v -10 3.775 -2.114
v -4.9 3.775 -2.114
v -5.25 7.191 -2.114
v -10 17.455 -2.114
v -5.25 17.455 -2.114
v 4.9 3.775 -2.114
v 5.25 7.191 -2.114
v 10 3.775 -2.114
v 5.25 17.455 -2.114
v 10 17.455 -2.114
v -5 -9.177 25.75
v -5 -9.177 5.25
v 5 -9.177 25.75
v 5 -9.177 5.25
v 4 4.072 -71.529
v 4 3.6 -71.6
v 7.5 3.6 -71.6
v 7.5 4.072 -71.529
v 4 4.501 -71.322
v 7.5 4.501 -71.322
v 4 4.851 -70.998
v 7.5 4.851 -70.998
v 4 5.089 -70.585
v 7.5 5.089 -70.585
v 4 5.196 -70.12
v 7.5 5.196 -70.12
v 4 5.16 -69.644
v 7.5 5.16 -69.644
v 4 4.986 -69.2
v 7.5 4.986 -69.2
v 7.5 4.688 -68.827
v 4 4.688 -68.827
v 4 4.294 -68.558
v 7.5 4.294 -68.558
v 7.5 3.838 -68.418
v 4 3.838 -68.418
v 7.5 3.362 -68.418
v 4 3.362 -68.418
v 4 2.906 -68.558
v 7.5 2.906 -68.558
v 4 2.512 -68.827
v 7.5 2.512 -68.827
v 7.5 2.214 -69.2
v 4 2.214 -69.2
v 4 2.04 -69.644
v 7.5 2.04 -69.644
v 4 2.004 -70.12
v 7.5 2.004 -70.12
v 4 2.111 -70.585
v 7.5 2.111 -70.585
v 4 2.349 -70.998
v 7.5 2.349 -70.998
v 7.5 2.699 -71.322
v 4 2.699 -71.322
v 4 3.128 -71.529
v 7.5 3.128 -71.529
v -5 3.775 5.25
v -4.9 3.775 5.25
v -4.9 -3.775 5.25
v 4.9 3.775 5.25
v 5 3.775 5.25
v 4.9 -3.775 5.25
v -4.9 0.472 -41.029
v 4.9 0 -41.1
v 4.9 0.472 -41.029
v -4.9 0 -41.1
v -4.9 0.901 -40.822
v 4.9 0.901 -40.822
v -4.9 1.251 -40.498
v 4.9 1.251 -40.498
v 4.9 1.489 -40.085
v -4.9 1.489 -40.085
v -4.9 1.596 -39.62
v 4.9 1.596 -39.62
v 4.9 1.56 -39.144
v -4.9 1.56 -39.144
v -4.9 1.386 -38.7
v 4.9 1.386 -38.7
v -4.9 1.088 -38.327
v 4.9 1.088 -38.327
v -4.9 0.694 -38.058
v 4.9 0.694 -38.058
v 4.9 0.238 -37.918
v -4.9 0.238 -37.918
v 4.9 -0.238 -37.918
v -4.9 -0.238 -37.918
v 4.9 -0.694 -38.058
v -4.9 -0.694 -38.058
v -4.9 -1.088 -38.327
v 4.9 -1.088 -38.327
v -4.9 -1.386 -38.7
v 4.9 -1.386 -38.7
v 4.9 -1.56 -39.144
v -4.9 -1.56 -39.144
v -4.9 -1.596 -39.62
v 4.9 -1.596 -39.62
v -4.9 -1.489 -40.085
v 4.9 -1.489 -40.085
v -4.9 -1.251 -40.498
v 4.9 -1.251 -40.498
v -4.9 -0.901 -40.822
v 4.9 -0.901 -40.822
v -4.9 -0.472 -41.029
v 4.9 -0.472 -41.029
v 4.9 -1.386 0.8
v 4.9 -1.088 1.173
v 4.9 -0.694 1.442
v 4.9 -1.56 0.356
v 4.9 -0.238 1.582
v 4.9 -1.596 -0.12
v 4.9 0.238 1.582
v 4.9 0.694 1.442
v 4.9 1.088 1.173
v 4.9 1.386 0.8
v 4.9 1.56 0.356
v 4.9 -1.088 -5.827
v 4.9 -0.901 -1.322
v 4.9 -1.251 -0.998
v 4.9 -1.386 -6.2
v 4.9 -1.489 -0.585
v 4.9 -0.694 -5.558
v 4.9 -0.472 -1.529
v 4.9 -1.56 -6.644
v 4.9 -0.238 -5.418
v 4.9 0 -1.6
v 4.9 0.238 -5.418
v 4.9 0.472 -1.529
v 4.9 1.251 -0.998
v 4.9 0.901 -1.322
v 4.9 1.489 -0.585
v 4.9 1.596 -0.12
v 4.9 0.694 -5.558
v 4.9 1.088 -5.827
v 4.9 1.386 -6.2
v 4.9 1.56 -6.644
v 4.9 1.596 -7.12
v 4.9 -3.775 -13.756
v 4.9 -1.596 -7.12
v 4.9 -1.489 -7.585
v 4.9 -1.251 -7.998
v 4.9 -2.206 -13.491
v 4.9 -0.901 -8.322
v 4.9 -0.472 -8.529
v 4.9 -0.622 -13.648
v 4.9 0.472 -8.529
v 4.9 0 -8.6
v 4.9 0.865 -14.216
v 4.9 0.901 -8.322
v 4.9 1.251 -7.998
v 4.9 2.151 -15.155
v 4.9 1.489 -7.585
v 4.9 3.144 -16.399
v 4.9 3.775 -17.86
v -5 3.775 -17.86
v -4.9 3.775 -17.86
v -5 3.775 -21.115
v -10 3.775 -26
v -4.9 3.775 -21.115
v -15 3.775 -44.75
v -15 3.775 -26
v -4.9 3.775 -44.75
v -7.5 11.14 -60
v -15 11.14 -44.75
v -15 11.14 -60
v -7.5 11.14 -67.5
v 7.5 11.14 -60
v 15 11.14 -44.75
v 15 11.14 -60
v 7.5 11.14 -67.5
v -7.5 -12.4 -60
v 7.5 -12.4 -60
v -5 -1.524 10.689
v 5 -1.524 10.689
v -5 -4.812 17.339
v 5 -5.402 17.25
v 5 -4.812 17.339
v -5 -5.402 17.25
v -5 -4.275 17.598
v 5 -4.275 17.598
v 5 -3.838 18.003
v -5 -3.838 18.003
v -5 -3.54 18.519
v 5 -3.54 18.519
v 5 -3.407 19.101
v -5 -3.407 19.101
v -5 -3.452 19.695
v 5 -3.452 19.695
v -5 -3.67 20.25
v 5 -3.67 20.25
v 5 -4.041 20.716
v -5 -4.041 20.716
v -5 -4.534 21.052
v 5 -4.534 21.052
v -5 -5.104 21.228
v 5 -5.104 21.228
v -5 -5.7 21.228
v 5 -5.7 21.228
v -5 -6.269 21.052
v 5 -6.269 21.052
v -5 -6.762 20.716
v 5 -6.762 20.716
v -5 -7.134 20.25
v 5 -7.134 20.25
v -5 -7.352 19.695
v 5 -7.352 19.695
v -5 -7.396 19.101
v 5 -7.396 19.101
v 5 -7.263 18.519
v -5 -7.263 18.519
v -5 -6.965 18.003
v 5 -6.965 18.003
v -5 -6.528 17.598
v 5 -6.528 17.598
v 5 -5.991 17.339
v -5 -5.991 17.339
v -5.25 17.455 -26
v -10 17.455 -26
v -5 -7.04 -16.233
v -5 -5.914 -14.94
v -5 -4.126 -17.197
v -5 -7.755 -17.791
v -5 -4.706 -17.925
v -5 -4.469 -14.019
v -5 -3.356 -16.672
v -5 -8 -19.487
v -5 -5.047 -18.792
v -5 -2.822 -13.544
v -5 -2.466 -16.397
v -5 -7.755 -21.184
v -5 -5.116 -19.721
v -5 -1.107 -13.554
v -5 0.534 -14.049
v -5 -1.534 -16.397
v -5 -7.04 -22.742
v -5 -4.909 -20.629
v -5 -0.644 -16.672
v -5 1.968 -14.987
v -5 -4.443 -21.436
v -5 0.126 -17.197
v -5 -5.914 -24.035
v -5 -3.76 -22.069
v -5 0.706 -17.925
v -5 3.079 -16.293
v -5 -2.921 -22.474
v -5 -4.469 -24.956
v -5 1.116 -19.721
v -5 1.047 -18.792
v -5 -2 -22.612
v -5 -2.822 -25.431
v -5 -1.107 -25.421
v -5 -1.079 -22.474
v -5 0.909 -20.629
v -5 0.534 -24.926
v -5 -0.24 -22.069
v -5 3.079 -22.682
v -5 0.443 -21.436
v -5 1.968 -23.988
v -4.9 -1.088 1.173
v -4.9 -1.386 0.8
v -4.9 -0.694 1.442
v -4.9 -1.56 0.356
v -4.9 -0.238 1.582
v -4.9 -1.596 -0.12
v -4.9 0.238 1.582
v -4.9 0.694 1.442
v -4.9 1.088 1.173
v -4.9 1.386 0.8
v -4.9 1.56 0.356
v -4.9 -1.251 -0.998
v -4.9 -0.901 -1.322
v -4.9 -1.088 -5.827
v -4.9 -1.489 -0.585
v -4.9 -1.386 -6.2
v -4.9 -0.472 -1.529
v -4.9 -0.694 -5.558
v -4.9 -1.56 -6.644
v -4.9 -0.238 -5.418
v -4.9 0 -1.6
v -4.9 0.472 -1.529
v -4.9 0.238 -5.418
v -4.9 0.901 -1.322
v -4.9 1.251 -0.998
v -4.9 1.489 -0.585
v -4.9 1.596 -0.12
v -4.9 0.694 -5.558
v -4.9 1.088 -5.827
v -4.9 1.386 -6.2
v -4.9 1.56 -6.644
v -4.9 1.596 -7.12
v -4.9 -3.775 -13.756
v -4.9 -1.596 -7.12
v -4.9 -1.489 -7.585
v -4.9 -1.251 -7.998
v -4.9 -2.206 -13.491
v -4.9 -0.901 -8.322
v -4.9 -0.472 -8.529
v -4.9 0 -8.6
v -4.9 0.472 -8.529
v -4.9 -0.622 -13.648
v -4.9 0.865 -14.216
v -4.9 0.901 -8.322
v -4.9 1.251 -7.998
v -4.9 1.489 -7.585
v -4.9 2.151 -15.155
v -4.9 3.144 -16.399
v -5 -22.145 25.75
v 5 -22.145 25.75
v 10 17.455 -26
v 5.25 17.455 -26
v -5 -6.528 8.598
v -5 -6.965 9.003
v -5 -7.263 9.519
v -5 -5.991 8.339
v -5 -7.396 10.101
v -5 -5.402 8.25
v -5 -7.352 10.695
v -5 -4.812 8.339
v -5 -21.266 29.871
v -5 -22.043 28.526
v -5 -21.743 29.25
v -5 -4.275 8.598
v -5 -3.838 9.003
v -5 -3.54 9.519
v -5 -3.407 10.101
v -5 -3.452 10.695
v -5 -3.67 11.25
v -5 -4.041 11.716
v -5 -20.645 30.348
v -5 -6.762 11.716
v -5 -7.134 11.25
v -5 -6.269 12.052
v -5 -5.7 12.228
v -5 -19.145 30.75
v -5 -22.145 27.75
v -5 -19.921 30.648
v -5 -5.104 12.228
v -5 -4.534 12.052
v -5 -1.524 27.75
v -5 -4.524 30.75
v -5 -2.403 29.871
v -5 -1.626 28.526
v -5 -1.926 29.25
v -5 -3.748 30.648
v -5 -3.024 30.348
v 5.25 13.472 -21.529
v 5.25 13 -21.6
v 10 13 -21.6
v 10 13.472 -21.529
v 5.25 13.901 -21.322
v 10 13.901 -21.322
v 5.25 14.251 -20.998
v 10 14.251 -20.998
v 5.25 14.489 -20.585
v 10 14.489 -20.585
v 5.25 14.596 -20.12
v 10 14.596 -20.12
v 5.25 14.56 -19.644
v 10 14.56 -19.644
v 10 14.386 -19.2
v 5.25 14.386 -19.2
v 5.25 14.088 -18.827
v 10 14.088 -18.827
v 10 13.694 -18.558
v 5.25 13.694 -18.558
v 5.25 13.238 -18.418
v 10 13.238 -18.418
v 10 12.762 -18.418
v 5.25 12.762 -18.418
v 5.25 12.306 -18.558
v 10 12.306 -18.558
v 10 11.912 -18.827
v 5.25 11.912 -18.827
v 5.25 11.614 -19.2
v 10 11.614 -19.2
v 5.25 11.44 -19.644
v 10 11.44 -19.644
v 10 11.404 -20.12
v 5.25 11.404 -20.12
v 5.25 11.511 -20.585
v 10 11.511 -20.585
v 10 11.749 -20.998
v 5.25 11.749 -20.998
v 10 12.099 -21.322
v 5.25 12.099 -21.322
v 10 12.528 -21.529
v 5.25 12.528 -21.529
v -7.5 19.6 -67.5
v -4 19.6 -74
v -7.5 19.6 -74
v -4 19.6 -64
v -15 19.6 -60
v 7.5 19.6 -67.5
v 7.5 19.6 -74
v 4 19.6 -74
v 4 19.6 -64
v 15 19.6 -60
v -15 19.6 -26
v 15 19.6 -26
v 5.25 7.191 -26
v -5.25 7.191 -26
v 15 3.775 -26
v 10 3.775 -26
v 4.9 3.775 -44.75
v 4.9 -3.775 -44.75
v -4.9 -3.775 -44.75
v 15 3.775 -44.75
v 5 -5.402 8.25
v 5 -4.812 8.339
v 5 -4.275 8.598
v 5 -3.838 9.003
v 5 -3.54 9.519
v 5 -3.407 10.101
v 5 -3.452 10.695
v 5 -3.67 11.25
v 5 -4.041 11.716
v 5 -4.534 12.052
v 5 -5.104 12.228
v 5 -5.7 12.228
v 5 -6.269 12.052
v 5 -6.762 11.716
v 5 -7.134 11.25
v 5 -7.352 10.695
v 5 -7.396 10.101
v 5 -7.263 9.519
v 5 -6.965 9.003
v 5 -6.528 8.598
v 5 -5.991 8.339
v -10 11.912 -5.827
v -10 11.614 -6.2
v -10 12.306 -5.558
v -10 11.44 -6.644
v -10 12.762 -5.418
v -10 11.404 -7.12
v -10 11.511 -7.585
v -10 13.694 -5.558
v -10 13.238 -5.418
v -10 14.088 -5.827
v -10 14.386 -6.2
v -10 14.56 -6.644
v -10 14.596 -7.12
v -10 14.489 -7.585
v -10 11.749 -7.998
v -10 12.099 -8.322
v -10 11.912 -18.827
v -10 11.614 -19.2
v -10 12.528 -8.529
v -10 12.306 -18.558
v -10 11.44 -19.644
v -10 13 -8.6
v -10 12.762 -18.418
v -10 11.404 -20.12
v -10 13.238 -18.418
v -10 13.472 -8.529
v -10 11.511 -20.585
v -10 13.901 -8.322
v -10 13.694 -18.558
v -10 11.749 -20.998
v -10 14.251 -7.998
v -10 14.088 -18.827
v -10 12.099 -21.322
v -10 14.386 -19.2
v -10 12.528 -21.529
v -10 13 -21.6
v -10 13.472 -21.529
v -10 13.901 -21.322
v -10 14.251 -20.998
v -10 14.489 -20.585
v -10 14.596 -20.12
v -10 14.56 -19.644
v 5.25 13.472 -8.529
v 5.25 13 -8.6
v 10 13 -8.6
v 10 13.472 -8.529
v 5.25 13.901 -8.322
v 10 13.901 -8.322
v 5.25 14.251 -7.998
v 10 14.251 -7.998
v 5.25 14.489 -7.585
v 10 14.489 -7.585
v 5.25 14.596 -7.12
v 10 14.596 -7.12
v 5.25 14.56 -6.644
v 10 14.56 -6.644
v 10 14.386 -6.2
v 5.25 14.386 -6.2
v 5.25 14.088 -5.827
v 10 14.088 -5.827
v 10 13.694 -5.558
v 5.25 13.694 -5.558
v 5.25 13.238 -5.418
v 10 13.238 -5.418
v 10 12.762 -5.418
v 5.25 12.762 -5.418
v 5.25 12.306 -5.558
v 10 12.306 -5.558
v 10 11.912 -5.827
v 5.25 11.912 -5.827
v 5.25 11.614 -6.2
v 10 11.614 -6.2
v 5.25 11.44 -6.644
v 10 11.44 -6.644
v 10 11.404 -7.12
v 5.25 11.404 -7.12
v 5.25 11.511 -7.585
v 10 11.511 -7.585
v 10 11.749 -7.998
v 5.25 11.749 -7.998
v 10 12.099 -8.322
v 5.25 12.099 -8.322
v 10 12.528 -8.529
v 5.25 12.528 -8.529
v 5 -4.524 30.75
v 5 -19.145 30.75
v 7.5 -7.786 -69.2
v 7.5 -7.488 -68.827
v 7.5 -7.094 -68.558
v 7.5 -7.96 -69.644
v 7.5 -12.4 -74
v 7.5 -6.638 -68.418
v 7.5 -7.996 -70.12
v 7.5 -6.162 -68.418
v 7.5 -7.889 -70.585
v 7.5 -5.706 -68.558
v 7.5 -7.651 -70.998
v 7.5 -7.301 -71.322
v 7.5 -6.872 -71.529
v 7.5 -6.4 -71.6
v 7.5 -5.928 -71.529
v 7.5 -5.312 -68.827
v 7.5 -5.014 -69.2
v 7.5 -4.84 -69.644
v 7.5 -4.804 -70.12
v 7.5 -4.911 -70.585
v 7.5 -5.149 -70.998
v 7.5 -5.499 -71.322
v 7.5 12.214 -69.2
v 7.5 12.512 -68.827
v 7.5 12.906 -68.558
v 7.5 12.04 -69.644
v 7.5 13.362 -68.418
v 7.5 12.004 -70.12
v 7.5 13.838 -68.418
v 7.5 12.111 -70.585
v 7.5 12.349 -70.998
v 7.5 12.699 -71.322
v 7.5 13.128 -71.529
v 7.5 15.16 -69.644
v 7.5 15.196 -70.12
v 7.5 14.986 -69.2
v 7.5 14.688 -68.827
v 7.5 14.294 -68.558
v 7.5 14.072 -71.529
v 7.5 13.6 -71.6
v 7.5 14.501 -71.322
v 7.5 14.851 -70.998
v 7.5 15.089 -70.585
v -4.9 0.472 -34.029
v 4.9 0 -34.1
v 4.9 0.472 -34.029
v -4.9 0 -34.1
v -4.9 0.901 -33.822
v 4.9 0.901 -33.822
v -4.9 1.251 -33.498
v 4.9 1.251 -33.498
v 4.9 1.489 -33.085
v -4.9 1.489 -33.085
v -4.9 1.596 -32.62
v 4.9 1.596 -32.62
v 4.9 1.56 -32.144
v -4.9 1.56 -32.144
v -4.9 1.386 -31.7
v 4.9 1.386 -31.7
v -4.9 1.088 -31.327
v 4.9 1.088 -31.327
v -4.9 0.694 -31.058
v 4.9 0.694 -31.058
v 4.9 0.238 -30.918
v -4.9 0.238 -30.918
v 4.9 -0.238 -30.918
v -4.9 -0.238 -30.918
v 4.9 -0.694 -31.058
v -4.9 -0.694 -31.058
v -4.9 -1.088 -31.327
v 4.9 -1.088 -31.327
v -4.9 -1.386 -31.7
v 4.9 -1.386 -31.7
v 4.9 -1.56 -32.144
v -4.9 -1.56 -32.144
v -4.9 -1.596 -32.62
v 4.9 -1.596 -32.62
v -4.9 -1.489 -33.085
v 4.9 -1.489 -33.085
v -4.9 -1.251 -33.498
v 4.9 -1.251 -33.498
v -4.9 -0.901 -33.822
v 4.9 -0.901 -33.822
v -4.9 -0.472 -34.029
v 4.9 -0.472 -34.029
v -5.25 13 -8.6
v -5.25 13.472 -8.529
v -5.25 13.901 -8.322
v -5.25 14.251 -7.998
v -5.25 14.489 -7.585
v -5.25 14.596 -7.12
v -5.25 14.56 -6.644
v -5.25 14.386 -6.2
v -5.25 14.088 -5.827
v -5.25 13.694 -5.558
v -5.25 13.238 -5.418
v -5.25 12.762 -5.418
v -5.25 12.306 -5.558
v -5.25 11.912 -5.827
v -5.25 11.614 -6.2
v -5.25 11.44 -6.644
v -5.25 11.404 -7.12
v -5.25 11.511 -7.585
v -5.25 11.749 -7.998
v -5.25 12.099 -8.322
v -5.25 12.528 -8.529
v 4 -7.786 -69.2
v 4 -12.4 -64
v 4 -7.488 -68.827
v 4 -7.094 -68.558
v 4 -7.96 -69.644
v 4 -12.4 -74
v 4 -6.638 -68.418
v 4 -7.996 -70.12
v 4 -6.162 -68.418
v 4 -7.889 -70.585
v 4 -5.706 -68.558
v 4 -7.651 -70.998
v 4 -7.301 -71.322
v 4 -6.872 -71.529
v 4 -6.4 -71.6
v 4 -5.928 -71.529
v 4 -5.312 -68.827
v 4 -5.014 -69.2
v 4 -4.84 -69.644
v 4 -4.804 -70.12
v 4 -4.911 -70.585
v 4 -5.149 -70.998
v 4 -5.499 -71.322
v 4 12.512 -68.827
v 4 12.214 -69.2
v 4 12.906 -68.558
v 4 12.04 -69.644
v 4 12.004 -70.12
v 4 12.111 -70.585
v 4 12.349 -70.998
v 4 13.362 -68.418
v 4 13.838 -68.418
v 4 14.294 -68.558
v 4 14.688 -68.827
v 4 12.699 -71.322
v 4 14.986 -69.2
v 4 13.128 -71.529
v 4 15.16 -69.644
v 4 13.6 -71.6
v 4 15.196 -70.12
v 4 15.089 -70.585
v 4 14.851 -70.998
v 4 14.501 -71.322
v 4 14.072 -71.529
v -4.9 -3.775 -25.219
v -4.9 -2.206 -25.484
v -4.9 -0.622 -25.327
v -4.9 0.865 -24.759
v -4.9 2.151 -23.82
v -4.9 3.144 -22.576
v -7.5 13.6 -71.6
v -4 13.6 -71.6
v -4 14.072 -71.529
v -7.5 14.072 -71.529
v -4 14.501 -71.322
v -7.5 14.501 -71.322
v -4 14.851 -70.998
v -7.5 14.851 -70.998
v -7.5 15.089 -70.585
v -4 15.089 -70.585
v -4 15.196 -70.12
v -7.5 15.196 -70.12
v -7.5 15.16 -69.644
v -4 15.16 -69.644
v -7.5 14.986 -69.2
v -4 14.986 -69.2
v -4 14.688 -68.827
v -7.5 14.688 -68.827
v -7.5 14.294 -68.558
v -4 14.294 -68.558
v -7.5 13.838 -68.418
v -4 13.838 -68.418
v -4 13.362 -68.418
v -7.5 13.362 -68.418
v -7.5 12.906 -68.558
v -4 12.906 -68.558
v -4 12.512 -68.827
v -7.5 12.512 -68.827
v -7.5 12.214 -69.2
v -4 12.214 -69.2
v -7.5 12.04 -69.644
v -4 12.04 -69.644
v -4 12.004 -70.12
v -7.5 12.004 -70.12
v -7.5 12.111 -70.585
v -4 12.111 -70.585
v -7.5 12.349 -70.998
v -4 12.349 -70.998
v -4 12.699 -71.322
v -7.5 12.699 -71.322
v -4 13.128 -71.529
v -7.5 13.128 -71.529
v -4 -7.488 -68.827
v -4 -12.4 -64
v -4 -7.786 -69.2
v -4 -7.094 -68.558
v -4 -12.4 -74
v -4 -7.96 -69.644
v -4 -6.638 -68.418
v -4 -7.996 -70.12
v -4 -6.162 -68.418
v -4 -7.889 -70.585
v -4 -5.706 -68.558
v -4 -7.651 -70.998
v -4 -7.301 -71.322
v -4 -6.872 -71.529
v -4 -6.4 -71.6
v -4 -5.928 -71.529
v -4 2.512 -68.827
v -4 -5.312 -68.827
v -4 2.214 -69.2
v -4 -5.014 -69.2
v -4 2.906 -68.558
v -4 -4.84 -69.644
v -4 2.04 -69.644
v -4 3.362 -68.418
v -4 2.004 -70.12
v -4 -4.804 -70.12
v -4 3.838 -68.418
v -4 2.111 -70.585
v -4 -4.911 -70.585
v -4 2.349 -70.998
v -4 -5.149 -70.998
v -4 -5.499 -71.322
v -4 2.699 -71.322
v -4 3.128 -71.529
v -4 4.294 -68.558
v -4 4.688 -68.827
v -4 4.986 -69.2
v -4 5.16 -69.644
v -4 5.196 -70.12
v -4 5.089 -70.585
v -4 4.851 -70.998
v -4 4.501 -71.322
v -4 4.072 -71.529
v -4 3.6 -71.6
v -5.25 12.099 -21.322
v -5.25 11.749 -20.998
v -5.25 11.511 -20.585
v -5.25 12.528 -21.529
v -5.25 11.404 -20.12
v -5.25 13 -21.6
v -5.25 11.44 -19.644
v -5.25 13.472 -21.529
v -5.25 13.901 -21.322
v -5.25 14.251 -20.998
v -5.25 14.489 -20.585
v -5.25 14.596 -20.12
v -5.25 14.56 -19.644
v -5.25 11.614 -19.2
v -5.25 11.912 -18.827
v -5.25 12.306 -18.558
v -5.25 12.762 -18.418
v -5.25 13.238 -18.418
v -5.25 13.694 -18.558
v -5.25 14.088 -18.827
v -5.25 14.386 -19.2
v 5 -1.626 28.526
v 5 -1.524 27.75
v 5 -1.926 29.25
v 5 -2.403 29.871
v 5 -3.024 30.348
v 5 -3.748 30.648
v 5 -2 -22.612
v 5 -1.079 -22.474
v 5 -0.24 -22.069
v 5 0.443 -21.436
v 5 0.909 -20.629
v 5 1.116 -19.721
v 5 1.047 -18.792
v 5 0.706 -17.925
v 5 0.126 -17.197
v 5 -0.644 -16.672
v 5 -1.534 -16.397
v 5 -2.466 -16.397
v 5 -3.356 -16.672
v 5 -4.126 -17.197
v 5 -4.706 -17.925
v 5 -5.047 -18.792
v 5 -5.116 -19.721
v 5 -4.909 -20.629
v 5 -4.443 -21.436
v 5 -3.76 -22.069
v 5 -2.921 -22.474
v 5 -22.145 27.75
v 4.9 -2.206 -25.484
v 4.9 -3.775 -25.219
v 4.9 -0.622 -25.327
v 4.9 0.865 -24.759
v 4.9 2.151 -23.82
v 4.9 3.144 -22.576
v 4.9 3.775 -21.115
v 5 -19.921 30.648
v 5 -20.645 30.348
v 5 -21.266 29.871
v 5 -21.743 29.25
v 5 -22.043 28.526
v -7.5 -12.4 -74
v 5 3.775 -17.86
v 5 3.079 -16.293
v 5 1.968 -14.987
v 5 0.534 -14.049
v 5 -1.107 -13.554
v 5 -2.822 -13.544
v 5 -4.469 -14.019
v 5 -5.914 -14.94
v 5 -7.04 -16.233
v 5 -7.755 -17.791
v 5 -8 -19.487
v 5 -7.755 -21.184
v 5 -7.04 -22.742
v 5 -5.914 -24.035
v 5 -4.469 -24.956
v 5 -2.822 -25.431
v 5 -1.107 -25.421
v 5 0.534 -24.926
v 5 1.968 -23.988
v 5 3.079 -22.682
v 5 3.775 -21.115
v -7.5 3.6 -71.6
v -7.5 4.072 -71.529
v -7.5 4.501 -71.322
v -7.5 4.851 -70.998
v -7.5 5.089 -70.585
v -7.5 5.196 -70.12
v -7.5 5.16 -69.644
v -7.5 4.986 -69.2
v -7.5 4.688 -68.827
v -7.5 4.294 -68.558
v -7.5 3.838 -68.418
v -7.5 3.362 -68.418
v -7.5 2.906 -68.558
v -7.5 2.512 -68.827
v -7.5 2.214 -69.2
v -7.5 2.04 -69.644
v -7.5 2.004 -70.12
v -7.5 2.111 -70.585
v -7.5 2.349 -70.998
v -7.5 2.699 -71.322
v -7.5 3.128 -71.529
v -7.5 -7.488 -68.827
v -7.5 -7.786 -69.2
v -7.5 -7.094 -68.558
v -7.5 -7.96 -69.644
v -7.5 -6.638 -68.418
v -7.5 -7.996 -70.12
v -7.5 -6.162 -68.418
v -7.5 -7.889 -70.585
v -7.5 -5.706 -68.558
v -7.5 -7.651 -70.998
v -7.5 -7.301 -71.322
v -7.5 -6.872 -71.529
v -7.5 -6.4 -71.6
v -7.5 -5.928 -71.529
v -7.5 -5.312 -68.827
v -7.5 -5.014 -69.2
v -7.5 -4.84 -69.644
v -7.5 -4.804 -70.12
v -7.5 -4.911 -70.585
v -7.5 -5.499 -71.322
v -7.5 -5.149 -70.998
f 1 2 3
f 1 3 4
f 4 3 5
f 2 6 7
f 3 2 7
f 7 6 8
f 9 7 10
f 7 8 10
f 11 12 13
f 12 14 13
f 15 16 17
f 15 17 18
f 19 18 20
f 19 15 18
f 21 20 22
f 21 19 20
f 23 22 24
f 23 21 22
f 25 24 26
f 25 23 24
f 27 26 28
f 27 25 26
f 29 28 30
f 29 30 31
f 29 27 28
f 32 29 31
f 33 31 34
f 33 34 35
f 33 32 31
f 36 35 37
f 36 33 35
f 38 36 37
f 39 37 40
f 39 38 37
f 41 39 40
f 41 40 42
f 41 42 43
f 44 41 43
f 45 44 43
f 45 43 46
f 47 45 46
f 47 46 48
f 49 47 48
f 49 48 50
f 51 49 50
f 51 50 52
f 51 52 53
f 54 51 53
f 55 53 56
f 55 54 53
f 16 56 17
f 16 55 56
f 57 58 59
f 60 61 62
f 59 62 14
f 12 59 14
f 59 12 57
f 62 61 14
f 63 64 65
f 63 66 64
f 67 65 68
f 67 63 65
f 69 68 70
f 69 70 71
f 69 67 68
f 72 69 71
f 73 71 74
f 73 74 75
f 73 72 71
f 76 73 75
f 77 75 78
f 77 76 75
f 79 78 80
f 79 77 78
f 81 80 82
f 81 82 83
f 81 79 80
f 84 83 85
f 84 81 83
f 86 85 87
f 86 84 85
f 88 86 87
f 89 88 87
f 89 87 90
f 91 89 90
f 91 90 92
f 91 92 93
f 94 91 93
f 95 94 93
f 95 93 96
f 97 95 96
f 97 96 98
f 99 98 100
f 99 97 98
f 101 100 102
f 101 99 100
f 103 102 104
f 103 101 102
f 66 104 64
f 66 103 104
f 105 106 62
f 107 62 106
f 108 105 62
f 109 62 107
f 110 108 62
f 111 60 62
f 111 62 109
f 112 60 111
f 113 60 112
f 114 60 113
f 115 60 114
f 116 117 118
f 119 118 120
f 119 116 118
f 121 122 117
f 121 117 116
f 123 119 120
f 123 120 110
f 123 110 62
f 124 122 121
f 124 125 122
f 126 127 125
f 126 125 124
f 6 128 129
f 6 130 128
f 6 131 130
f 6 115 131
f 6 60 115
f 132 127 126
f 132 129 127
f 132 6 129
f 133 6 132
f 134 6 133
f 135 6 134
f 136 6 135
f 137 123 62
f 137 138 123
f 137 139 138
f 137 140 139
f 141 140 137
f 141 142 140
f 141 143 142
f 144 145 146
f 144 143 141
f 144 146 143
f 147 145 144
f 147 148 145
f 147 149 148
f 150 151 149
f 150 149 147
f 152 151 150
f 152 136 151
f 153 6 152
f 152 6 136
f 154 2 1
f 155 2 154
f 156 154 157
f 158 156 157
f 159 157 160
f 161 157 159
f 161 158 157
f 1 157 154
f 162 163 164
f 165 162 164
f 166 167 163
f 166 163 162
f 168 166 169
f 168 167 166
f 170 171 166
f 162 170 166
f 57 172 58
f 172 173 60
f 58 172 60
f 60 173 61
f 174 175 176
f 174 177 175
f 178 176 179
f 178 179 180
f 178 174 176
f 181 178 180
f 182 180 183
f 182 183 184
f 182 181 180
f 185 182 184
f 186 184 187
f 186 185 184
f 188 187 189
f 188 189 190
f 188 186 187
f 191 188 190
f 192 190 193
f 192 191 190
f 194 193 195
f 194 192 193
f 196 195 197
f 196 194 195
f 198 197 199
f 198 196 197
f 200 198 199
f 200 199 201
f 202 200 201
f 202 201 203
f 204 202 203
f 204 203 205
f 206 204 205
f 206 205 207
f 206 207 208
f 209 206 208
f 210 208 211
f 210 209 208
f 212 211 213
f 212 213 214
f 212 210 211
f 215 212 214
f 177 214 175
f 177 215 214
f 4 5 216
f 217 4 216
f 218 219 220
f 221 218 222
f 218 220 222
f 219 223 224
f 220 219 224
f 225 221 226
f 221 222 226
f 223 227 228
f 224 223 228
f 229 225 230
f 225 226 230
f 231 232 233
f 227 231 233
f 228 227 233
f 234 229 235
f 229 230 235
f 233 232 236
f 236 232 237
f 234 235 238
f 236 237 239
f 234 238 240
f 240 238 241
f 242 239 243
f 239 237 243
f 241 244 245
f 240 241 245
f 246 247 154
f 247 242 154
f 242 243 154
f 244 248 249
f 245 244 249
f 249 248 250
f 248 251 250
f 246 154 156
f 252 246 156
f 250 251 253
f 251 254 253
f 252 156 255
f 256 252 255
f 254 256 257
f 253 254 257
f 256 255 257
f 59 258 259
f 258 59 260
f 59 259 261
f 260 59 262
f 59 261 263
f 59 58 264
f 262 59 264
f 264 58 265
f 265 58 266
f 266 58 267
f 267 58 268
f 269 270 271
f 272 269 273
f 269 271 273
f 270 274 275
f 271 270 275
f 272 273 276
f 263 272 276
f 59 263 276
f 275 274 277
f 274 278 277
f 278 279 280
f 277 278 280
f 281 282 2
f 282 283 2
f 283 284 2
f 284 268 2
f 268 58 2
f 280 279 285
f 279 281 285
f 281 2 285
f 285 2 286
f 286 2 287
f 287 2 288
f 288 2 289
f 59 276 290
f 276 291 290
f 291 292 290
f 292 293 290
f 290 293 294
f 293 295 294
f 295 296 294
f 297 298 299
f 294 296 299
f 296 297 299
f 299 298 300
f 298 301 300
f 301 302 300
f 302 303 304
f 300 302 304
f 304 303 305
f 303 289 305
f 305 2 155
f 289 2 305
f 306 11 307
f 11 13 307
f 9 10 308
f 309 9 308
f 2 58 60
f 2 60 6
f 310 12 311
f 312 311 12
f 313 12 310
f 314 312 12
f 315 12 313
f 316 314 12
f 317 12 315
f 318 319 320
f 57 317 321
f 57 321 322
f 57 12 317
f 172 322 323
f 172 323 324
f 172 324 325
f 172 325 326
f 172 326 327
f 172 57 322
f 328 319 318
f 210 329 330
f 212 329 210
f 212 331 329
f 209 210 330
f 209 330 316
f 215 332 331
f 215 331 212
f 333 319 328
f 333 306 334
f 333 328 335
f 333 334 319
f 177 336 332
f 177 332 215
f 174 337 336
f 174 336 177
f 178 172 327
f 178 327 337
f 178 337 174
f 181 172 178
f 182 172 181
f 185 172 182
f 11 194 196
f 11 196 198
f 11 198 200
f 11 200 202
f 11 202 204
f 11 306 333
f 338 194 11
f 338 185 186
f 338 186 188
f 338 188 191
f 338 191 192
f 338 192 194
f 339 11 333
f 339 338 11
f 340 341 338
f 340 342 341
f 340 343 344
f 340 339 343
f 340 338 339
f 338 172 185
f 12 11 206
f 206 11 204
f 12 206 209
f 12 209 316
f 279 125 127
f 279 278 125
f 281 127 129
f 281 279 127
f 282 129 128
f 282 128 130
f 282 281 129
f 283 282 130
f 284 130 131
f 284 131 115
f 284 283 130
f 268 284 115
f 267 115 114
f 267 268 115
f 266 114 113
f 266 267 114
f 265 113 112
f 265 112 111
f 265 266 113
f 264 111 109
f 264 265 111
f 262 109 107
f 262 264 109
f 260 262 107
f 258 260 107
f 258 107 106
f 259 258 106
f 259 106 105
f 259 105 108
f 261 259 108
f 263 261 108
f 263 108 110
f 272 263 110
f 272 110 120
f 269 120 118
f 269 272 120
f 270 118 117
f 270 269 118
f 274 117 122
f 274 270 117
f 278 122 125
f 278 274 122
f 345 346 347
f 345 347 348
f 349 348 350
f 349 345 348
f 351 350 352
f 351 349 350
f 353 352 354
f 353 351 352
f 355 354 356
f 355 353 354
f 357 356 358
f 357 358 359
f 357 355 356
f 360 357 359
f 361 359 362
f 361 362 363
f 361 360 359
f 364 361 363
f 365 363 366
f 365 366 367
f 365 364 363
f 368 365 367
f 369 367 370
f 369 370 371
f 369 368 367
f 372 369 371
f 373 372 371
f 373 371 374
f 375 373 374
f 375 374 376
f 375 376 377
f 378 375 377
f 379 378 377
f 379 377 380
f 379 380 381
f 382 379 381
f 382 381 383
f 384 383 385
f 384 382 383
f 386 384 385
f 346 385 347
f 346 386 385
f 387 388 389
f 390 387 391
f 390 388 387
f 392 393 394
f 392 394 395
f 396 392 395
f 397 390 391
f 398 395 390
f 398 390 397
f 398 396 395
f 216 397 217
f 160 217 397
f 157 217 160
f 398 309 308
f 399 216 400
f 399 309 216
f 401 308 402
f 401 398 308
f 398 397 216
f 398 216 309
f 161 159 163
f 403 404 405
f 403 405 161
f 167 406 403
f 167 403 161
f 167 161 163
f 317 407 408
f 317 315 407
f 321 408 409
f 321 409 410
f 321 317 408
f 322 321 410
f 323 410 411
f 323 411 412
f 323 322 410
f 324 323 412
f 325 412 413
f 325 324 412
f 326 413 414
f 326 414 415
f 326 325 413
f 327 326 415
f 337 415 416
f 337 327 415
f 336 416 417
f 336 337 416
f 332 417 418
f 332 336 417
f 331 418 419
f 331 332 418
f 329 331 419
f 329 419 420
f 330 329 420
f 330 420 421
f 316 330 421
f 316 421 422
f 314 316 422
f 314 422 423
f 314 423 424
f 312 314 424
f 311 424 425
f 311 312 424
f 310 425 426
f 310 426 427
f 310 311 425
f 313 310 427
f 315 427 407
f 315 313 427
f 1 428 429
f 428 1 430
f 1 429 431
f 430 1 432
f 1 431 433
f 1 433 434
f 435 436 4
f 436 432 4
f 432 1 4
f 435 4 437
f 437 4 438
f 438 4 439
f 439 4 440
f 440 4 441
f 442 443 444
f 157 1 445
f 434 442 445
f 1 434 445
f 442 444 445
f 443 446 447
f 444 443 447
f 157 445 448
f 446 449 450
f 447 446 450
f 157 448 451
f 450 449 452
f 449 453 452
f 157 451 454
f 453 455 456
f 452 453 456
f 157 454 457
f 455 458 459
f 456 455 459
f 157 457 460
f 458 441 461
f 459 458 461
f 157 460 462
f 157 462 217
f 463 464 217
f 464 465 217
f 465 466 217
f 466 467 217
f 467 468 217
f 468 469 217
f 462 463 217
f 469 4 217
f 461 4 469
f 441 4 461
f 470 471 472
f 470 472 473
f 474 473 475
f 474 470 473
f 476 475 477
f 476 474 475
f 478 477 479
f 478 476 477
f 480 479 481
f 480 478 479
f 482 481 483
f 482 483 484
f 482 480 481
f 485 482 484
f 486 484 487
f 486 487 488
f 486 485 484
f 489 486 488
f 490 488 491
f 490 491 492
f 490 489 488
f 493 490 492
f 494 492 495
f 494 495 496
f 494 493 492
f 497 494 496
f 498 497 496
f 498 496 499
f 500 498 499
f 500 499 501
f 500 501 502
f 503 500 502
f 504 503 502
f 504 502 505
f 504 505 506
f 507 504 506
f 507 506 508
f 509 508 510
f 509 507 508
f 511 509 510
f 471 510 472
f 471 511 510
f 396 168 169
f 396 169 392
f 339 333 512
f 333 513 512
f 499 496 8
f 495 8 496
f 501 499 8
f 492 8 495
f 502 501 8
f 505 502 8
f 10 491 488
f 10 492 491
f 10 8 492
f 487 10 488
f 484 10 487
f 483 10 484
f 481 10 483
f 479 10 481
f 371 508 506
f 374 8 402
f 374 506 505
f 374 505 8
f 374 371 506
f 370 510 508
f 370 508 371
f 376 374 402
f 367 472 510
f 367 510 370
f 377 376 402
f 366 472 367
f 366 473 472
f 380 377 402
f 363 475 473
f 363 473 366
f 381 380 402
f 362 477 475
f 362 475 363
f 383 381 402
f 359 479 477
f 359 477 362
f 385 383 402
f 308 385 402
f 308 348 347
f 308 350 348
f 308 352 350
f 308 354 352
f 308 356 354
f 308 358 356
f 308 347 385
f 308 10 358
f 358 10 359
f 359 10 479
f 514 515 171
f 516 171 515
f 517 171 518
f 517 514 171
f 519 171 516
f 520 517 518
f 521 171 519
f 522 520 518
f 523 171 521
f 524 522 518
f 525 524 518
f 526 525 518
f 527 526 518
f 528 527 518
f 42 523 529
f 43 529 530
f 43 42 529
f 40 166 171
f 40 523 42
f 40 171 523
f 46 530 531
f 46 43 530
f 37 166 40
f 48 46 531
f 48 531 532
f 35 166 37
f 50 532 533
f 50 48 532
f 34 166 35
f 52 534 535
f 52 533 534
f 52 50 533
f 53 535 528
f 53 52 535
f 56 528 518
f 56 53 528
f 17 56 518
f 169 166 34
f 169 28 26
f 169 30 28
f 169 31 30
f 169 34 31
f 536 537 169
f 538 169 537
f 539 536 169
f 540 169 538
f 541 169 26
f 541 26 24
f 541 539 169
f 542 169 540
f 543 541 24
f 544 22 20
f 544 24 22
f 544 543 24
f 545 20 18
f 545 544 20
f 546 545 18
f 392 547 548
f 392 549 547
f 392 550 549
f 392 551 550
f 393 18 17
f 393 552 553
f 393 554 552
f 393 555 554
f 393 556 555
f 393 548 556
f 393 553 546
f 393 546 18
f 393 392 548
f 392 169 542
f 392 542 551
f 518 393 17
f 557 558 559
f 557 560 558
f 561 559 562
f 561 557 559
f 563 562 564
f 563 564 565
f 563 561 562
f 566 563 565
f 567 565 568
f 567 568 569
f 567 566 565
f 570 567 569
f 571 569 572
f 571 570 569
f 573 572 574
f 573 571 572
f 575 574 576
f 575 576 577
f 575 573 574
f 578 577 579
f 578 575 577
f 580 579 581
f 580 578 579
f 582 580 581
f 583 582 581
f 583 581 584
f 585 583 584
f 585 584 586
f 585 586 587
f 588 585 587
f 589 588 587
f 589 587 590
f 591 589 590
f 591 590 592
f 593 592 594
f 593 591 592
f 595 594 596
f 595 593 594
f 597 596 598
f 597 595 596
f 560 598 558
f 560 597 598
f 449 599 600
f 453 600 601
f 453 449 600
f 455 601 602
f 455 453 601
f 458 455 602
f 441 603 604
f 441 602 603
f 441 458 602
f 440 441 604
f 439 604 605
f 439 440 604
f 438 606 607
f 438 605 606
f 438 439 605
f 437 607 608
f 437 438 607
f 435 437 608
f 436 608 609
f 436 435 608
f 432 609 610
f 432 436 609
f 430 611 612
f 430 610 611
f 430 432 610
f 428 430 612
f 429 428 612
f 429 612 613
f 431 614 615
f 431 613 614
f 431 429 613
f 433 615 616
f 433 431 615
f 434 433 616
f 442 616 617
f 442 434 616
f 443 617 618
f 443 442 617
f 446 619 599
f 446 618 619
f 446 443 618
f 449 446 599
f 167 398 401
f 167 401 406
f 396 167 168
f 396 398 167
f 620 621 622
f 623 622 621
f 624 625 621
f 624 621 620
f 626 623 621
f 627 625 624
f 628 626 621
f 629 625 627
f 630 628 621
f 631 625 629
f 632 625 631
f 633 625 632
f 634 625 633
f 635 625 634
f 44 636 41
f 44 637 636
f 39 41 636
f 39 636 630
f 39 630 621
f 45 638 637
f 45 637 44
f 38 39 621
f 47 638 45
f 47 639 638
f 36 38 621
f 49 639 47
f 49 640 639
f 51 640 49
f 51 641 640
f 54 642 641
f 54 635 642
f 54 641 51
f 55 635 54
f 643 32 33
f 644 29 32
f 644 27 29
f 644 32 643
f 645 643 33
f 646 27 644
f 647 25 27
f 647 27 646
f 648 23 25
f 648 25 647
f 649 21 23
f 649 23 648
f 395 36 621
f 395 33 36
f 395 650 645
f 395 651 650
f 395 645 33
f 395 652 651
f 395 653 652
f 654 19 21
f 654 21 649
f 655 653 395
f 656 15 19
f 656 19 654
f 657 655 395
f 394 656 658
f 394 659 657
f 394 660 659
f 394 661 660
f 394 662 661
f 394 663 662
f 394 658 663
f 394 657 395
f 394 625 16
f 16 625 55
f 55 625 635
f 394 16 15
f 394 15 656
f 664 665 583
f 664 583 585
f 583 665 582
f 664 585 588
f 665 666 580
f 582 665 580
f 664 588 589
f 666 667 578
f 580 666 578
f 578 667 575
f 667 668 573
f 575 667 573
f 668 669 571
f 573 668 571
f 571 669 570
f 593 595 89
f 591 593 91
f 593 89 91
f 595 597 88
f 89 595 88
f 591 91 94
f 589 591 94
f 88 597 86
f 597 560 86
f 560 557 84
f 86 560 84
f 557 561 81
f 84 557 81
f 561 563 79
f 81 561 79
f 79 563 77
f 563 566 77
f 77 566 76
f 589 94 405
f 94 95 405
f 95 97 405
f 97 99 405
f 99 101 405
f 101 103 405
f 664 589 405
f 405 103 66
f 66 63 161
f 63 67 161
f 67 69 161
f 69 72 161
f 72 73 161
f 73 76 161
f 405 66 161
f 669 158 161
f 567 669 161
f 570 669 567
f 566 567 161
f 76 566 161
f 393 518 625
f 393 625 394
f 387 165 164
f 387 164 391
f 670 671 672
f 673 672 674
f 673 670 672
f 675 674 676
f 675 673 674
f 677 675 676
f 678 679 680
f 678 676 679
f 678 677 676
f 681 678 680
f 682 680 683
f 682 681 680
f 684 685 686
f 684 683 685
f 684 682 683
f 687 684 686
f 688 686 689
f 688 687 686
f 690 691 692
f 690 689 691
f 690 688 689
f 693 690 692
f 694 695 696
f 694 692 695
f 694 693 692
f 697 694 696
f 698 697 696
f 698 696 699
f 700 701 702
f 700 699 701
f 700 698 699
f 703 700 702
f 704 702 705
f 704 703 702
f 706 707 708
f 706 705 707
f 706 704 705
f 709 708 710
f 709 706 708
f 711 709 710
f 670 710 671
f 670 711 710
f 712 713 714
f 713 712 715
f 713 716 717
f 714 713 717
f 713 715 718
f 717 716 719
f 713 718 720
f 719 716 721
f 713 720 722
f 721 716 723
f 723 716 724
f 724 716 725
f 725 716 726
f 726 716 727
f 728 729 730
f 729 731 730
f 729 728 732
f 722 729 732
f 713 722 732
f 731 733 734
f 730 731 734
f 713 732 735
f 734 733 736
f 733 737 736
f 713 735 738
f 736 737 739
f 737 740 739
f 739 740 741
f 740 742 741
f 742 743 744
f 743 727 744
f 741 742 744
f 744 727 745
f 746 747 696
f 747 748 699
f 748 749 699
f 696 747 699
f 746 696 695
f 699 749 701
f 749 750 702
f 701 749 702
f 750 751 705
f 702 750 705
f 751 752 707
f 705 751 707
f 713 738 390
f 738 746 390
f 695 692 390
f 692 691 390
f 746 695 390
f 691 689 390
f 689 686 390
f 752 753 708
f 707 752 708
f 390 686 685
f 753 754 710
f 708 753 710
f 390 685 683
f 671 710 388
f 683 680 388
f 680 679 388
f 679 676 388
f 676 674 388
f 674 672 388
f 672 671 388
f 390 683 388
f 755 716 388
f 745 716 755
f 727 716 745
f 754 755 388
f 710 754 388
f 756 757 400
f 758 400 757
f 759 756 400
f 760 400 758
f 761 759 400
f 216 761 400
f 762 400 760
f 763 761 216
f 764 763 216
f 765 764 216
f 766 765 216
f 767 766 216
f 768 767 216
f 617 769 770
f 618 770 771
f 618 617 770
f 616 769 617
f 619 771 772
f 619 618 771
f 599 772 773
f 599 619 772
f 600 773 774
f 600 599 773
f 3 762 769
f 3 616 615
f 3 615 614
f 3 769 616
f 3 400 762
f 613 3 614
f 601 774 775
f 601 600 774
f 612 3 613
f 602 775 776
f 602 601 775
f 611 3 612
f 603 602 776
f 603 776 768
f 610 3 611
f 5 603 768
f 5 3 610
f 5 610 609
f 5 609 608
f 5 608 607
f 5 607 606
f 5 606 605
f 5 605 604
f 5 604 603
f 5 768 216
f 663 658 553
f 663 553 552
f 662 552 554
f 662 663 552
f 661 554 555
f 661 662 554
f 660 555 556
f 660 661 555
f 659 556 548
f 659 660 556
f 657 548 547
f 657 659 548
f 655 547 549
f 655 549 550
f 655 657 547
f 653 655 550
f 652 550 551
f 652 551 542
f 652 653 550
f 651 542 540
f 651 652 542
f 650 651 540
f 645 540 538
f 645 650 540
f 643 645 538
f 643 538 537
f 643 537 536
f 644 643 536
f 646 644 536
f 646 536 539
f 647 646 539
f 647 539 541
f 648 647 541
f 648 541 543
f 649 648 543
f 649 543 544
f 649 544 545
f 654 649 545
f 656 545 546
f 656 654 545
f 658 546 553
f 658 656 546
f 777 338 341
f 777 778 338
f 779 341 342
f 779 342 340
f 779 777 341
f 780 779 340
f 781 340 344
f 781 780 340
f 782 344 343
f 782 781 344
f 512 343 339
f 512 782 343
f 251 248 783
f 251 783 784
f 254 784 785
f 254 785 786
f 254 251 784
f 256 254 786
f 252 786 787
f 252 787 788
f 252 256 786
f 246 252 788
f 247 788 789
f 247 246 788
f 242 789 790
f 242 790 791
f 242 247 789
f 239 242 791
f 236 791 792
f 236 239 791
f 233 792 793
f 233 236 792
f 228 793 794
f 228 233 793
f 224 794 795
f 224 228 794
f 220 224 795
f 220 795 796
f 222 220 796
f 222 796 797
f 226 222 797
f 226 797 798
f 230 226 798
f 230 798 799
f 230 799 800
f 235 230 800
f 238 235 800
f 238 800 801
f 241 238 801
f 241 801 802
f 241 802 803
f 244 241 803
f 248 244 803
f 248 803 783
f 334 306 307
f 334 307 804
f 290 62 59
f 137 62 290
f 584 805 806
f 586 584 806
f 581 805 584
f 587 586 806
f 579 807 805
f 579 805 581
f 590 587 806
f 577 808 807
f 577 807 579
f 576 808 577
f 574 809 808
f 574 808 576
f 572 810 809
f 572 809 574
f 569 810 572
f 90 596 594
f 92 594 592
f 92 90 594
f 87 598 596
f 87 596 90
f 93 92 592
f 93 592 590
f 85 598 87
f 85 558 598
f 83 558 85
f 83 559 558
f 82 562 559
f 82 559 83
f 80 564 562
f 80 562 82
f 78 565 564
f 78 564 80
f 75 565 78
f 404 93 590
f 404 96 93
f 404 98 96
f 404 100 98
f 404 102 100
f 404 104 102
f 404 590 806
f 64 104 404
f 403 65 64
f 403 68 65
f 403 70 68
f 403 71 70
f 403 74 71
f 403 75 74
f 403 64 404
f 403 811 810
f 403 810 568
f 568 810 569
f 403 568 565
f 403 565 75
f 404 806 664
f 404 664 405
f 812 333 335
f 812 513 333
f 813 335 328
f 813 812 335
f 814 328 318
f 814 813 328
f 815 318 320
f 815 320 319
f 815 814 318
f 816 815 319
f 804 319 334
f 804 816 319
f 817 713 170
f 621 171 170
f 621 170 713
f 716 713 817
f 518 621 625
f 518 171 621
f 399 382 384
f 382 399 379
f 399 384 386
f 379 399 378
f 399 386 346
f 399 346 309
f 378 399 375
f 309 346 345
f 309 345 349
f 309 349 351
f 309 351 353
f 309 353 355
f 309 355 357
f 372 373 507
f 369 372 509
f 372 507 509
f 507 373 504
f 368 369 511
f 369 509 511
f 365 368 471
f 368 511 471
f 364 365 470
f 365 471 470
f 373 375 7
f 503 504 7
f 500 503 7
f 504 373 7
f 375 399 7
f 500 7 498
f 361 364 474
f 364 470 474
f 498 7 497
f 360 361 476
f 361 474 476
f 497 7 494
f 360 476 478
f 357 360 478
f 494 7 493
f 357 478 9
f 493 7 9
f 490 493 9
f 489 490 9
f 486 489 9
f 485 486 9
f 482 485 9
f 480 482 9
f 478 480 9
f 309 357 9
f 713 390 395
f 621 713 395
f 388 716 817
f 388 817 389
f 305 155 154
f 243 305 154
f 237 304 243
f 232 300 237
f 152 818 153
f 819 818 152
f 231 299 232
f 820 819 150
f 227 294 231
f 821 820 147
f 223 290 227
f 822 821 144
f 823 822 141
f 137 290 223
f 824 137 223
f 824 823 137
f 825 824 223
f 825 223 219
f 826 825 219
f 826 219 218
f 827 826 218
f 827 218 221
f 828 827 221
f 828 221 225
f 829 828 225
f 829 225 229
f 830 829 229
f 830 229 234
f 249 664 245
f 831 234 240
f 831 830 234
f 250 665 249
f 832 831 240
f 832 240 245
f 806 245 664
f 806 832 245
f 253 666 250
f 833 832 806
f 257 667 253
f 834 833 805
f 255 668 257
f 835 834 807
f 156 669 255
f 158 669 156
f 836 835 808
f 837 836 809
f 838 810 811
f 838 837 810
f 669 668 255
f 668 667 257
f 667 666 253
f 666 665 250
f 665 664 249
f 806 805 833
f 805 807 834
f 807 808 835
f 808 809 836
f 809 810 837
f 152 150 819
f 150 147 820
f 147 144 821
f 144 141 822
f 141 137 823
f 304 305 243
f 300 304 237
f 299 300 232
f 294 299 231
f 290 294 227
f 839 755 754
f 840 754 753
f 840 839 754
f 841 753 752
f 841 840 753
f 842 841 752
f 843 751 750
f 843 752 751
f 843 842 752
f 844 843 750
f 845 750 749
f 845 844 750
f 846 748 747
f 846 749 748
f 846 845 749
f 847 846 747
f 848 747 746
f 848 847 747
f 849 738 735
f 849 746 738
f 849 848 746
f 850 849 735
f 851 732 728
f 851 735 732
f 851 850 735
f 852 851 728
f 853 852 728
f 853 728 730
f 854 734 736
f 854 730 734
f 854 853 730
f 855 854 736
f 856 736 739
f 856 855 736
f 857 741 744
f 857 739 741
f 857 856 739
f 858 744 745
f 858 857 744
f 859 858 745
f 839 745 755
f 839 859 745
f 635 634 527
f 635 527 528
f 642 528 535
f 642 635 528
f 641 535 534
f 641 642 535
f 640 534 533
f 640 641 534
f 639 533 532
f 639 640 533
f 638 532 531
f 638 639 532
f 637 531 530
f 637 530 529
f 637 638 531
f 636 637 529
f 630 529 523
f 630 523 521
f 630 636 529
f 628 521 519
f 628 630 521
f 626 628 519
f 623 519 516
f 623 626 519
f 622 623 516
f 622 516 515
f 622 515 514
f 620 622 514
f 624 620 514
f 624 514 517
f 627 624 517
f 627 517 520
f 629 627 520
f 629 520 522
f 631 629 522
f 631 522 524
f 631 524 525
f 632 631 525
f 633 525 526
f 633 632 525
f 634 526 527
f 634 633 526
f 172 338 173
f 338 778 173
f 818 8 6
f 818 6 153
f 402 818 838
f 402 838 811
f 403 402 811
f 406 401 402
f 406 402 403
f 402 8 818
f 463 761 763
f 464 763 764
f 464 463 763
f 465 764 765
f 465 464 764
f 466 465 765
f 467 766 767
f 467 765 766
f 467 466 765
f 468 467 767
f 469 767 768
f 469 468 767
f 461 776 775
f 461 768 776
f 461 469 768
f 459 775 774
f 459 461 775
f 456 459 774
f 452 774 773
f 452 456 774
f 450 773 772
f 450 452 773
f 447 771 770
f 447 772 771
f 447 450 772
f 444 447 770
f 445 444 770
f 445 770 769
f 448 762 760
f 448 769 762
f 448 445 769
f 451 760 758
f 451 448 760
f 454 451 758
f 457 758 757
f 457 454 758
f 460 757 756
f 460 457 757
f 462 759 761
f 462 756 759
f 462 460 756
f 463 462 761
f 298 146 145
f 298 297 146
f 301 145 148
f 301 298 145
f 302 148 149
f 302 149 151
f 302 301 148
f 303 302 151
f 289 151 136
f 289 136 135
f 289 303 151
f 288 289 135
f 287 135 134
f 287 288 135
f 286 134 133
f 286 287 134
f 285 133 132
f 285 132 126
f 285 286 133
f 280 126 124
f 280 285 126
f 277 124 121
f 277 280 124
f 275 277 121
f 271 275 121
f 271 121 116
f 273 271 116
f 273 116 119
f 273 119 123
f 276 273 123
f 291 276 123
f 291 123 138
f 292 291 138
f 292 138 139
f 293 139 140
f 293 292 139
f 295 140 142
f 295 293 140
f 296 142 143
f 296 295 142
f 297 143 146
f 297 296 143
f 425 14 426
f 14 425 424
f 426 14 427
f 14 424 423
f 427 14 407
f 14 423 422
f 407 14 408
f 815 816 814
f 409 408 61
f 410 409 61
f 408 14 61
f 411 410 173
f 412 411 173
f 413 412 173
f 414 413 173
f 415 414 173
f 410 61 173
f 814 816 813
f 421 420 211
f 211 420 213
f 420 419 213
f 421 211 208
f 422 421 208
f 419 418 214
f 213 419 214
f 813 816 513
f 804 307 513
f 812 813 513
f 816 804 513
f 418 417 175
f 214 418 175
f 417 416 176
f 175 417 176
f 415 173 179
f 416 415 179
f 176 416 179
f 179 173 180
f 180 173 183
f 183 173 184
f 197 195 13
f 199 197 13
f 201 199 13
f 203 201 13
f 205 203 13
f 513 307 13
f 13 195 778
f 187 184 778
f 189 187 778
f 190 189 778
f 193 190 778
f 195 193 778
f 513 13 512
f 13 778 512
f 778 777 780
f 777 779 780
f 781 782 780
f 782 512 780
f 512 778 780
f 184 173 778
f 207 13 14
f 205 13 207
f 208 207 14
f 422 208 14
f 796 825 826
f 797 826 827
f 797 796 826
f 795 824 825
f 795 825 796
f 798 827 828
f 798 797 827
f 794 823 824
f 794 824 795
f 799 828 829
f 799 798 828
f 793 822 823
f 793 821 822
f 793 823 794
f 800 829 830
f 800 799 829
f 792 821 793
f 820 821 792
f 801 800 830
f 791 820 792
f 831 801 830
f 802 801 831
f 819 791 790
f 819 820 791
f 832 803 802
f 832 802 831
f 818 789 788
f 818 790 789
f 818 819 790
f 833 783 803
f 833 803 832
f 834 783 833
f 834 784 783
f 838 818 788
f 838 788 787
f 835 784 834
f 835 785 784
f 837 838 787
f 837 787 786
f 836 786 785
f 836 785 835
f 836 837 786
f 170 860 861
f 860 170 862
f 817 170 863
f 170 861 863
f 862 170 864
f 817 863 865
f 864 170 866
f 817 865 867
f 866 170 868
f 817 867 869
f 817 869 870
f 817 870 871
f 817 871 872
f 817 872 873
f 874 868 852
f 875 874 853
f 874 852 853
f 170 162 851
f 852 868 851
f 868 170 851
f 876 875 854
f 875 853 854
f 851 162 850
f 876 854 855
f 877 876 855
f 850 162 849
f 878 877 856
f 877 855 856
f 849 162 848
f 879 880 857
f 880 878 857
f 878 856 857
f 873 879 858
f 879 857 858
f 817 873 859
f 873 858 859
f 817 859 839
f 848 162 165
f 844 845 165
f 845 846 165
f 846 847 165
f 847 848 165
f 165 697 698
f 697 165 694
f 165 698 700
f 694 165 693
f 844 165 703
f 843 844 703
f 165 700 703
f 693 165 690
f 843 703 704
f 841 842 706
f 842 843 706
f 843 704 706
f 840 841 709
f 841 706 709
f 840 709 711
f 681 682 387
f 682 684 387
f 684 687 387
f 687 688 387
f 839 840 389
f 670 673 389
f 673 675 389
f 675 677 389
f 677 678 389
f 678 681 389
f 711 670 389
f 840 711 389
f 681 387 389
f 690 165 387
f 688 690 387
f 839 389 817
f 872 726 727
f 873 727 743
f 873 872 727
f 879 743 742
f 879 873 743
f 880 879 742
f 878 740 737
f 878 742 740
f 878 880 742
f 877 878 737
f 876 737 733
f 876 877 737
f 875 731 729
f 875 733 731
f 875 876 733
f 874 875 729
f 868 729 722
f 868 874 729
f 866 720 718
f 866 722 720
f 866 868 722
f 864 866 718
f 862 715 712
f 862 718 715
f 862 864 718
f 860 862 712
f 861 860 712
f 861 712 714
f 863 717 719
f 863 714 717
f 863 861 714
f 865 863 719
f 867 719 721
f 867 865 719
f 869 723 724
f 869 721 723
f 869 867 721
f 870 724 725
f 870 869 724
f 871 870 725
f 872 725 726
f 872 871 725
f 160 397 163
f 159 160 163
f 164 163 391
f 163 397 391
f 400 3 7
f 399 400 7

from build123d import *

# Parameters (mm, degrees)
SKETCH_2_W               = 50
SKETCH_2_H               = 7.55
SKETCH_2_R               = 1.6
EXTRUDE_1_DEPTH          = 4.9
SKETCH_3_W               = 23.885574904
SKETCH_3_H               = 13.680093874
SKETCH_3_R               = 1.6
EXTRUDE_2_DEPTH          = 10
SKETCH_4_W               = 10.5
SKETCH_4_H               = 10.264550668
CUT_EXTRUDE_1_DEPTH      = 48.143107127
SKETCH_6_W               = 14
SKETCH_6_H               = 32
SKETCH_6_R               = 1.6
EXTRUDE_4_DEPTH          = 7.5
SKETCH_7_W               = 8
SKETCH_7_H               = 32
CUT_EXTRUDE_2_DEPTH      = 10
EXTRUDE_5_DEPTH          = 15
CHAMFER_1_SIZE           = 7.5
SKETCH_10_R              = 2
EXTRUDE_6_DEPTH          = 5
FILLET_1_R               = 3
SKETCH_11_R              = 6
SKETCH_11_R_2            = 3.125
EXTRUDE_7_DEPTH          = 5
CUT_EXTRUDE_3_DEPTH      = 79.685454984
CUT_EXTRUDE_3_DEPTH_BACK = 79.685454984
SKETCH_12_R              = 3.125


with BuildPart() as part:
    # 草图2 → 凸台-拉伸1 (new, symmetric)
    with BuildSketch(Plane(origin=(0, 0, 0), x_dir=(0, 0, -1), z_dir=(1, 0, 0))):
        with Locations((19.75, 0)):
            Rectangle(SKETCH_2_W, SKETCH_2_H)
        Circle(SKETCH_2_R, mode=Mode.SUBTRACT)
        with Locations((7, 0)):
            Circle(SKETCH_2_R, mode=Mode.SUBTRACT)
        with Locations((32.5, 0)):
            Circle(SKETCH_2_R, mode=Mode.SUBTRACT)
        with Locations((39.5, 0)):
            Circle(SKETCH_2_R, mode=Mode.SUBTRACT)
    extrude(amount=EXTRUDE_1_DEPTH, both=True)

    # 草图3 → 凸台-拉伸2 (add, symmetric)
    with BuildSketch(Plane(origin=(0, 0, 0), x_dir=(0, 0, -1), z_dir=(1, 0, 0))):
        with Locations((14.057212548, 10.615046937)):
            Rectangle(SKETCH_3_W, SKETCH_3_H)
        with Locations((7, 13)):
            Circle(SKETCH_3_R, mode=Mode.SUBTRACT)
        with Locations((20, 13)):
            Circle(SKETCH_3_R, mode=Mode.SUBTRACT)
    extrude(amount=EXTRUDE_2_DEPTH, both=True)

    # 草图4 → 切除-拉伸1 (cut, through all)
    with BuildSketch(Plane.XY.offset(-2.114425096)):
        with Locations((0, 12.32281854)):
            Rectangle(SKETCH_4_W, SKETCH_4_H)
    extrude(amount=-CUT_EXTRUDE_1_DEPTH, mode=Mode.SUBTRACT)



with BuildPart() as body_2:
    # 草图6 → 凸台-拉伸4 (new, symmetric)
    with BuildSketch(Plane(origin=(0, 0, 0), x_dir=(0, 0, -1), z_dir=(1, 0, 0))):
        with Locations((67, 3.6)):
            Rectangle(SKETCH_6_W, SKETCH_6_H)
        with Locations((70, 3.6)):
            Circle(SKETCH_6_R, mode=Mode.SUBTRACT)
        with Locations((70, 13.6)):
            Circle(SKETCH_6_R, mode=Mode.SUBTRACT)
        with Locations((70, -6.4)):
            Circle(SKETCH_6_R, mode=Mode.SUBTRACT)
    extrude(amount=EXTRUDE_4_DEPTH, both=True)

    # 草图7 → 切除-拉伸2 (cut)
    with BuildSketch(Plane.XY.offset(-74)):
        with Locations((0, 3.6)):
            Rectangle(SKETCH_7_W, SKETCH_7_H)
    extrude(amount=CUT_EXTRUDE_2_DEPTH, mode=Mode.SUBTRACT)


with BuildPart() as part_1:
    add(part.part)

    add(body_2.part)  # 凸台-拉伸5 merges body 2
    # 草图8 → 凸台-拉伸5 (add, symmetric)
    with BuildSketch(Plane(origin=(0, 0, 0), x_dir=(0, 0, -1), z_dir=(1, 0, 0))):
        Polygon((60, 19.6), (26, 19.6), (26, 11.139938787), (26, 3.775), (44.75, 3.775), (44.75, 11.139938787), (60, 11.139938787), align=None)
    extrude(amount=EXTRUDE_5_DEPTH, both=True)

    # 倒角1
    chamfer_1_edges = [part_1.edges().sort_by_distance(p)[0] for p in [
        (-7.5, 15.369969393, -60),
        (7.5, 15.369969393, -60),
    ]]
    chamfer(chamfer_1_edges, length=CHAMFER_1_SIZE - 0.0001)  # a hair under: the kernel refuses the full size

    # 草图10 → 凸台-拉伸6 (add, symmetric)
    with BuildSketch(Plane(origin=(0, 0, 0), x_dir=(0, 0, -1), z_dir=(1, 0, 0))):
        Polygon((-5.25, 3.775), (-5.25, -9.176683543), (-25.75, -9.176683543), (-25.75, -22.144995508), (-30.75, -22.144995508), (-30.75, -1.524124881), (-10.688710914, -1.524124881), align=None)
        with Locations((-10.25, -5.401683543)):
            Circle(SKETCH_10_R, mode=Mode.SUBTRACT)
        with Locations((-19.25, -5.401683543)):
            Circle(SKETCH_10_R, mode=Mode.SUBTRACT)
    extrude(amount=EXTRUDE_6_DEPTH, both=True)

    # 圆角1
    fillet_1_edges = [part_1.edges().sort_by_distance(p)[0] for p in [
        (0, -1.524124881, 30.75),
        (0, -22.144995508, 30.75),
    ]]
    fillet(fillet_1_edges, radius=FILLET_1_R)

    # 草图11 → 凸台-拉伸7 (add, symmetric)
    with BuildSketch(Plane(origin=(0, 0, 0), x_dir=(0, 0, -1), z_dir=(1, 0, 0))):
        with Locations((19.487465682, -2)):
            Circle(SKETCH_11_R)
        with Locations((19.487465682, -2)):
            Circle(SKETCH_11_R_2, mode=Mode.SUBTRACT)
    extrude(amount=EXTRUDE_7_DEPTH, both=True)

    # 草图12 → 切除-拉伸3 (cut, two sides: drawn at the far end of the back side and taken through both)
    with BuildSketch(Plane(origin=(0, 0, 0), x_dir=(0, 0, -1), z_dir=(1, 0, 0)).offset(-CUT_EXTRUDE_3_DEPTH_BACK)):
        with Locations((19.487465682, -2)):
            Circle(SKETCH_12_R)
    extrude(amount=CUT_EXTRUDE_3_DEPTH + CUT_EXTRUDE_3_DEPTH_BACK, mode=Mode.SUBTRACT)


solid = part_1.part
